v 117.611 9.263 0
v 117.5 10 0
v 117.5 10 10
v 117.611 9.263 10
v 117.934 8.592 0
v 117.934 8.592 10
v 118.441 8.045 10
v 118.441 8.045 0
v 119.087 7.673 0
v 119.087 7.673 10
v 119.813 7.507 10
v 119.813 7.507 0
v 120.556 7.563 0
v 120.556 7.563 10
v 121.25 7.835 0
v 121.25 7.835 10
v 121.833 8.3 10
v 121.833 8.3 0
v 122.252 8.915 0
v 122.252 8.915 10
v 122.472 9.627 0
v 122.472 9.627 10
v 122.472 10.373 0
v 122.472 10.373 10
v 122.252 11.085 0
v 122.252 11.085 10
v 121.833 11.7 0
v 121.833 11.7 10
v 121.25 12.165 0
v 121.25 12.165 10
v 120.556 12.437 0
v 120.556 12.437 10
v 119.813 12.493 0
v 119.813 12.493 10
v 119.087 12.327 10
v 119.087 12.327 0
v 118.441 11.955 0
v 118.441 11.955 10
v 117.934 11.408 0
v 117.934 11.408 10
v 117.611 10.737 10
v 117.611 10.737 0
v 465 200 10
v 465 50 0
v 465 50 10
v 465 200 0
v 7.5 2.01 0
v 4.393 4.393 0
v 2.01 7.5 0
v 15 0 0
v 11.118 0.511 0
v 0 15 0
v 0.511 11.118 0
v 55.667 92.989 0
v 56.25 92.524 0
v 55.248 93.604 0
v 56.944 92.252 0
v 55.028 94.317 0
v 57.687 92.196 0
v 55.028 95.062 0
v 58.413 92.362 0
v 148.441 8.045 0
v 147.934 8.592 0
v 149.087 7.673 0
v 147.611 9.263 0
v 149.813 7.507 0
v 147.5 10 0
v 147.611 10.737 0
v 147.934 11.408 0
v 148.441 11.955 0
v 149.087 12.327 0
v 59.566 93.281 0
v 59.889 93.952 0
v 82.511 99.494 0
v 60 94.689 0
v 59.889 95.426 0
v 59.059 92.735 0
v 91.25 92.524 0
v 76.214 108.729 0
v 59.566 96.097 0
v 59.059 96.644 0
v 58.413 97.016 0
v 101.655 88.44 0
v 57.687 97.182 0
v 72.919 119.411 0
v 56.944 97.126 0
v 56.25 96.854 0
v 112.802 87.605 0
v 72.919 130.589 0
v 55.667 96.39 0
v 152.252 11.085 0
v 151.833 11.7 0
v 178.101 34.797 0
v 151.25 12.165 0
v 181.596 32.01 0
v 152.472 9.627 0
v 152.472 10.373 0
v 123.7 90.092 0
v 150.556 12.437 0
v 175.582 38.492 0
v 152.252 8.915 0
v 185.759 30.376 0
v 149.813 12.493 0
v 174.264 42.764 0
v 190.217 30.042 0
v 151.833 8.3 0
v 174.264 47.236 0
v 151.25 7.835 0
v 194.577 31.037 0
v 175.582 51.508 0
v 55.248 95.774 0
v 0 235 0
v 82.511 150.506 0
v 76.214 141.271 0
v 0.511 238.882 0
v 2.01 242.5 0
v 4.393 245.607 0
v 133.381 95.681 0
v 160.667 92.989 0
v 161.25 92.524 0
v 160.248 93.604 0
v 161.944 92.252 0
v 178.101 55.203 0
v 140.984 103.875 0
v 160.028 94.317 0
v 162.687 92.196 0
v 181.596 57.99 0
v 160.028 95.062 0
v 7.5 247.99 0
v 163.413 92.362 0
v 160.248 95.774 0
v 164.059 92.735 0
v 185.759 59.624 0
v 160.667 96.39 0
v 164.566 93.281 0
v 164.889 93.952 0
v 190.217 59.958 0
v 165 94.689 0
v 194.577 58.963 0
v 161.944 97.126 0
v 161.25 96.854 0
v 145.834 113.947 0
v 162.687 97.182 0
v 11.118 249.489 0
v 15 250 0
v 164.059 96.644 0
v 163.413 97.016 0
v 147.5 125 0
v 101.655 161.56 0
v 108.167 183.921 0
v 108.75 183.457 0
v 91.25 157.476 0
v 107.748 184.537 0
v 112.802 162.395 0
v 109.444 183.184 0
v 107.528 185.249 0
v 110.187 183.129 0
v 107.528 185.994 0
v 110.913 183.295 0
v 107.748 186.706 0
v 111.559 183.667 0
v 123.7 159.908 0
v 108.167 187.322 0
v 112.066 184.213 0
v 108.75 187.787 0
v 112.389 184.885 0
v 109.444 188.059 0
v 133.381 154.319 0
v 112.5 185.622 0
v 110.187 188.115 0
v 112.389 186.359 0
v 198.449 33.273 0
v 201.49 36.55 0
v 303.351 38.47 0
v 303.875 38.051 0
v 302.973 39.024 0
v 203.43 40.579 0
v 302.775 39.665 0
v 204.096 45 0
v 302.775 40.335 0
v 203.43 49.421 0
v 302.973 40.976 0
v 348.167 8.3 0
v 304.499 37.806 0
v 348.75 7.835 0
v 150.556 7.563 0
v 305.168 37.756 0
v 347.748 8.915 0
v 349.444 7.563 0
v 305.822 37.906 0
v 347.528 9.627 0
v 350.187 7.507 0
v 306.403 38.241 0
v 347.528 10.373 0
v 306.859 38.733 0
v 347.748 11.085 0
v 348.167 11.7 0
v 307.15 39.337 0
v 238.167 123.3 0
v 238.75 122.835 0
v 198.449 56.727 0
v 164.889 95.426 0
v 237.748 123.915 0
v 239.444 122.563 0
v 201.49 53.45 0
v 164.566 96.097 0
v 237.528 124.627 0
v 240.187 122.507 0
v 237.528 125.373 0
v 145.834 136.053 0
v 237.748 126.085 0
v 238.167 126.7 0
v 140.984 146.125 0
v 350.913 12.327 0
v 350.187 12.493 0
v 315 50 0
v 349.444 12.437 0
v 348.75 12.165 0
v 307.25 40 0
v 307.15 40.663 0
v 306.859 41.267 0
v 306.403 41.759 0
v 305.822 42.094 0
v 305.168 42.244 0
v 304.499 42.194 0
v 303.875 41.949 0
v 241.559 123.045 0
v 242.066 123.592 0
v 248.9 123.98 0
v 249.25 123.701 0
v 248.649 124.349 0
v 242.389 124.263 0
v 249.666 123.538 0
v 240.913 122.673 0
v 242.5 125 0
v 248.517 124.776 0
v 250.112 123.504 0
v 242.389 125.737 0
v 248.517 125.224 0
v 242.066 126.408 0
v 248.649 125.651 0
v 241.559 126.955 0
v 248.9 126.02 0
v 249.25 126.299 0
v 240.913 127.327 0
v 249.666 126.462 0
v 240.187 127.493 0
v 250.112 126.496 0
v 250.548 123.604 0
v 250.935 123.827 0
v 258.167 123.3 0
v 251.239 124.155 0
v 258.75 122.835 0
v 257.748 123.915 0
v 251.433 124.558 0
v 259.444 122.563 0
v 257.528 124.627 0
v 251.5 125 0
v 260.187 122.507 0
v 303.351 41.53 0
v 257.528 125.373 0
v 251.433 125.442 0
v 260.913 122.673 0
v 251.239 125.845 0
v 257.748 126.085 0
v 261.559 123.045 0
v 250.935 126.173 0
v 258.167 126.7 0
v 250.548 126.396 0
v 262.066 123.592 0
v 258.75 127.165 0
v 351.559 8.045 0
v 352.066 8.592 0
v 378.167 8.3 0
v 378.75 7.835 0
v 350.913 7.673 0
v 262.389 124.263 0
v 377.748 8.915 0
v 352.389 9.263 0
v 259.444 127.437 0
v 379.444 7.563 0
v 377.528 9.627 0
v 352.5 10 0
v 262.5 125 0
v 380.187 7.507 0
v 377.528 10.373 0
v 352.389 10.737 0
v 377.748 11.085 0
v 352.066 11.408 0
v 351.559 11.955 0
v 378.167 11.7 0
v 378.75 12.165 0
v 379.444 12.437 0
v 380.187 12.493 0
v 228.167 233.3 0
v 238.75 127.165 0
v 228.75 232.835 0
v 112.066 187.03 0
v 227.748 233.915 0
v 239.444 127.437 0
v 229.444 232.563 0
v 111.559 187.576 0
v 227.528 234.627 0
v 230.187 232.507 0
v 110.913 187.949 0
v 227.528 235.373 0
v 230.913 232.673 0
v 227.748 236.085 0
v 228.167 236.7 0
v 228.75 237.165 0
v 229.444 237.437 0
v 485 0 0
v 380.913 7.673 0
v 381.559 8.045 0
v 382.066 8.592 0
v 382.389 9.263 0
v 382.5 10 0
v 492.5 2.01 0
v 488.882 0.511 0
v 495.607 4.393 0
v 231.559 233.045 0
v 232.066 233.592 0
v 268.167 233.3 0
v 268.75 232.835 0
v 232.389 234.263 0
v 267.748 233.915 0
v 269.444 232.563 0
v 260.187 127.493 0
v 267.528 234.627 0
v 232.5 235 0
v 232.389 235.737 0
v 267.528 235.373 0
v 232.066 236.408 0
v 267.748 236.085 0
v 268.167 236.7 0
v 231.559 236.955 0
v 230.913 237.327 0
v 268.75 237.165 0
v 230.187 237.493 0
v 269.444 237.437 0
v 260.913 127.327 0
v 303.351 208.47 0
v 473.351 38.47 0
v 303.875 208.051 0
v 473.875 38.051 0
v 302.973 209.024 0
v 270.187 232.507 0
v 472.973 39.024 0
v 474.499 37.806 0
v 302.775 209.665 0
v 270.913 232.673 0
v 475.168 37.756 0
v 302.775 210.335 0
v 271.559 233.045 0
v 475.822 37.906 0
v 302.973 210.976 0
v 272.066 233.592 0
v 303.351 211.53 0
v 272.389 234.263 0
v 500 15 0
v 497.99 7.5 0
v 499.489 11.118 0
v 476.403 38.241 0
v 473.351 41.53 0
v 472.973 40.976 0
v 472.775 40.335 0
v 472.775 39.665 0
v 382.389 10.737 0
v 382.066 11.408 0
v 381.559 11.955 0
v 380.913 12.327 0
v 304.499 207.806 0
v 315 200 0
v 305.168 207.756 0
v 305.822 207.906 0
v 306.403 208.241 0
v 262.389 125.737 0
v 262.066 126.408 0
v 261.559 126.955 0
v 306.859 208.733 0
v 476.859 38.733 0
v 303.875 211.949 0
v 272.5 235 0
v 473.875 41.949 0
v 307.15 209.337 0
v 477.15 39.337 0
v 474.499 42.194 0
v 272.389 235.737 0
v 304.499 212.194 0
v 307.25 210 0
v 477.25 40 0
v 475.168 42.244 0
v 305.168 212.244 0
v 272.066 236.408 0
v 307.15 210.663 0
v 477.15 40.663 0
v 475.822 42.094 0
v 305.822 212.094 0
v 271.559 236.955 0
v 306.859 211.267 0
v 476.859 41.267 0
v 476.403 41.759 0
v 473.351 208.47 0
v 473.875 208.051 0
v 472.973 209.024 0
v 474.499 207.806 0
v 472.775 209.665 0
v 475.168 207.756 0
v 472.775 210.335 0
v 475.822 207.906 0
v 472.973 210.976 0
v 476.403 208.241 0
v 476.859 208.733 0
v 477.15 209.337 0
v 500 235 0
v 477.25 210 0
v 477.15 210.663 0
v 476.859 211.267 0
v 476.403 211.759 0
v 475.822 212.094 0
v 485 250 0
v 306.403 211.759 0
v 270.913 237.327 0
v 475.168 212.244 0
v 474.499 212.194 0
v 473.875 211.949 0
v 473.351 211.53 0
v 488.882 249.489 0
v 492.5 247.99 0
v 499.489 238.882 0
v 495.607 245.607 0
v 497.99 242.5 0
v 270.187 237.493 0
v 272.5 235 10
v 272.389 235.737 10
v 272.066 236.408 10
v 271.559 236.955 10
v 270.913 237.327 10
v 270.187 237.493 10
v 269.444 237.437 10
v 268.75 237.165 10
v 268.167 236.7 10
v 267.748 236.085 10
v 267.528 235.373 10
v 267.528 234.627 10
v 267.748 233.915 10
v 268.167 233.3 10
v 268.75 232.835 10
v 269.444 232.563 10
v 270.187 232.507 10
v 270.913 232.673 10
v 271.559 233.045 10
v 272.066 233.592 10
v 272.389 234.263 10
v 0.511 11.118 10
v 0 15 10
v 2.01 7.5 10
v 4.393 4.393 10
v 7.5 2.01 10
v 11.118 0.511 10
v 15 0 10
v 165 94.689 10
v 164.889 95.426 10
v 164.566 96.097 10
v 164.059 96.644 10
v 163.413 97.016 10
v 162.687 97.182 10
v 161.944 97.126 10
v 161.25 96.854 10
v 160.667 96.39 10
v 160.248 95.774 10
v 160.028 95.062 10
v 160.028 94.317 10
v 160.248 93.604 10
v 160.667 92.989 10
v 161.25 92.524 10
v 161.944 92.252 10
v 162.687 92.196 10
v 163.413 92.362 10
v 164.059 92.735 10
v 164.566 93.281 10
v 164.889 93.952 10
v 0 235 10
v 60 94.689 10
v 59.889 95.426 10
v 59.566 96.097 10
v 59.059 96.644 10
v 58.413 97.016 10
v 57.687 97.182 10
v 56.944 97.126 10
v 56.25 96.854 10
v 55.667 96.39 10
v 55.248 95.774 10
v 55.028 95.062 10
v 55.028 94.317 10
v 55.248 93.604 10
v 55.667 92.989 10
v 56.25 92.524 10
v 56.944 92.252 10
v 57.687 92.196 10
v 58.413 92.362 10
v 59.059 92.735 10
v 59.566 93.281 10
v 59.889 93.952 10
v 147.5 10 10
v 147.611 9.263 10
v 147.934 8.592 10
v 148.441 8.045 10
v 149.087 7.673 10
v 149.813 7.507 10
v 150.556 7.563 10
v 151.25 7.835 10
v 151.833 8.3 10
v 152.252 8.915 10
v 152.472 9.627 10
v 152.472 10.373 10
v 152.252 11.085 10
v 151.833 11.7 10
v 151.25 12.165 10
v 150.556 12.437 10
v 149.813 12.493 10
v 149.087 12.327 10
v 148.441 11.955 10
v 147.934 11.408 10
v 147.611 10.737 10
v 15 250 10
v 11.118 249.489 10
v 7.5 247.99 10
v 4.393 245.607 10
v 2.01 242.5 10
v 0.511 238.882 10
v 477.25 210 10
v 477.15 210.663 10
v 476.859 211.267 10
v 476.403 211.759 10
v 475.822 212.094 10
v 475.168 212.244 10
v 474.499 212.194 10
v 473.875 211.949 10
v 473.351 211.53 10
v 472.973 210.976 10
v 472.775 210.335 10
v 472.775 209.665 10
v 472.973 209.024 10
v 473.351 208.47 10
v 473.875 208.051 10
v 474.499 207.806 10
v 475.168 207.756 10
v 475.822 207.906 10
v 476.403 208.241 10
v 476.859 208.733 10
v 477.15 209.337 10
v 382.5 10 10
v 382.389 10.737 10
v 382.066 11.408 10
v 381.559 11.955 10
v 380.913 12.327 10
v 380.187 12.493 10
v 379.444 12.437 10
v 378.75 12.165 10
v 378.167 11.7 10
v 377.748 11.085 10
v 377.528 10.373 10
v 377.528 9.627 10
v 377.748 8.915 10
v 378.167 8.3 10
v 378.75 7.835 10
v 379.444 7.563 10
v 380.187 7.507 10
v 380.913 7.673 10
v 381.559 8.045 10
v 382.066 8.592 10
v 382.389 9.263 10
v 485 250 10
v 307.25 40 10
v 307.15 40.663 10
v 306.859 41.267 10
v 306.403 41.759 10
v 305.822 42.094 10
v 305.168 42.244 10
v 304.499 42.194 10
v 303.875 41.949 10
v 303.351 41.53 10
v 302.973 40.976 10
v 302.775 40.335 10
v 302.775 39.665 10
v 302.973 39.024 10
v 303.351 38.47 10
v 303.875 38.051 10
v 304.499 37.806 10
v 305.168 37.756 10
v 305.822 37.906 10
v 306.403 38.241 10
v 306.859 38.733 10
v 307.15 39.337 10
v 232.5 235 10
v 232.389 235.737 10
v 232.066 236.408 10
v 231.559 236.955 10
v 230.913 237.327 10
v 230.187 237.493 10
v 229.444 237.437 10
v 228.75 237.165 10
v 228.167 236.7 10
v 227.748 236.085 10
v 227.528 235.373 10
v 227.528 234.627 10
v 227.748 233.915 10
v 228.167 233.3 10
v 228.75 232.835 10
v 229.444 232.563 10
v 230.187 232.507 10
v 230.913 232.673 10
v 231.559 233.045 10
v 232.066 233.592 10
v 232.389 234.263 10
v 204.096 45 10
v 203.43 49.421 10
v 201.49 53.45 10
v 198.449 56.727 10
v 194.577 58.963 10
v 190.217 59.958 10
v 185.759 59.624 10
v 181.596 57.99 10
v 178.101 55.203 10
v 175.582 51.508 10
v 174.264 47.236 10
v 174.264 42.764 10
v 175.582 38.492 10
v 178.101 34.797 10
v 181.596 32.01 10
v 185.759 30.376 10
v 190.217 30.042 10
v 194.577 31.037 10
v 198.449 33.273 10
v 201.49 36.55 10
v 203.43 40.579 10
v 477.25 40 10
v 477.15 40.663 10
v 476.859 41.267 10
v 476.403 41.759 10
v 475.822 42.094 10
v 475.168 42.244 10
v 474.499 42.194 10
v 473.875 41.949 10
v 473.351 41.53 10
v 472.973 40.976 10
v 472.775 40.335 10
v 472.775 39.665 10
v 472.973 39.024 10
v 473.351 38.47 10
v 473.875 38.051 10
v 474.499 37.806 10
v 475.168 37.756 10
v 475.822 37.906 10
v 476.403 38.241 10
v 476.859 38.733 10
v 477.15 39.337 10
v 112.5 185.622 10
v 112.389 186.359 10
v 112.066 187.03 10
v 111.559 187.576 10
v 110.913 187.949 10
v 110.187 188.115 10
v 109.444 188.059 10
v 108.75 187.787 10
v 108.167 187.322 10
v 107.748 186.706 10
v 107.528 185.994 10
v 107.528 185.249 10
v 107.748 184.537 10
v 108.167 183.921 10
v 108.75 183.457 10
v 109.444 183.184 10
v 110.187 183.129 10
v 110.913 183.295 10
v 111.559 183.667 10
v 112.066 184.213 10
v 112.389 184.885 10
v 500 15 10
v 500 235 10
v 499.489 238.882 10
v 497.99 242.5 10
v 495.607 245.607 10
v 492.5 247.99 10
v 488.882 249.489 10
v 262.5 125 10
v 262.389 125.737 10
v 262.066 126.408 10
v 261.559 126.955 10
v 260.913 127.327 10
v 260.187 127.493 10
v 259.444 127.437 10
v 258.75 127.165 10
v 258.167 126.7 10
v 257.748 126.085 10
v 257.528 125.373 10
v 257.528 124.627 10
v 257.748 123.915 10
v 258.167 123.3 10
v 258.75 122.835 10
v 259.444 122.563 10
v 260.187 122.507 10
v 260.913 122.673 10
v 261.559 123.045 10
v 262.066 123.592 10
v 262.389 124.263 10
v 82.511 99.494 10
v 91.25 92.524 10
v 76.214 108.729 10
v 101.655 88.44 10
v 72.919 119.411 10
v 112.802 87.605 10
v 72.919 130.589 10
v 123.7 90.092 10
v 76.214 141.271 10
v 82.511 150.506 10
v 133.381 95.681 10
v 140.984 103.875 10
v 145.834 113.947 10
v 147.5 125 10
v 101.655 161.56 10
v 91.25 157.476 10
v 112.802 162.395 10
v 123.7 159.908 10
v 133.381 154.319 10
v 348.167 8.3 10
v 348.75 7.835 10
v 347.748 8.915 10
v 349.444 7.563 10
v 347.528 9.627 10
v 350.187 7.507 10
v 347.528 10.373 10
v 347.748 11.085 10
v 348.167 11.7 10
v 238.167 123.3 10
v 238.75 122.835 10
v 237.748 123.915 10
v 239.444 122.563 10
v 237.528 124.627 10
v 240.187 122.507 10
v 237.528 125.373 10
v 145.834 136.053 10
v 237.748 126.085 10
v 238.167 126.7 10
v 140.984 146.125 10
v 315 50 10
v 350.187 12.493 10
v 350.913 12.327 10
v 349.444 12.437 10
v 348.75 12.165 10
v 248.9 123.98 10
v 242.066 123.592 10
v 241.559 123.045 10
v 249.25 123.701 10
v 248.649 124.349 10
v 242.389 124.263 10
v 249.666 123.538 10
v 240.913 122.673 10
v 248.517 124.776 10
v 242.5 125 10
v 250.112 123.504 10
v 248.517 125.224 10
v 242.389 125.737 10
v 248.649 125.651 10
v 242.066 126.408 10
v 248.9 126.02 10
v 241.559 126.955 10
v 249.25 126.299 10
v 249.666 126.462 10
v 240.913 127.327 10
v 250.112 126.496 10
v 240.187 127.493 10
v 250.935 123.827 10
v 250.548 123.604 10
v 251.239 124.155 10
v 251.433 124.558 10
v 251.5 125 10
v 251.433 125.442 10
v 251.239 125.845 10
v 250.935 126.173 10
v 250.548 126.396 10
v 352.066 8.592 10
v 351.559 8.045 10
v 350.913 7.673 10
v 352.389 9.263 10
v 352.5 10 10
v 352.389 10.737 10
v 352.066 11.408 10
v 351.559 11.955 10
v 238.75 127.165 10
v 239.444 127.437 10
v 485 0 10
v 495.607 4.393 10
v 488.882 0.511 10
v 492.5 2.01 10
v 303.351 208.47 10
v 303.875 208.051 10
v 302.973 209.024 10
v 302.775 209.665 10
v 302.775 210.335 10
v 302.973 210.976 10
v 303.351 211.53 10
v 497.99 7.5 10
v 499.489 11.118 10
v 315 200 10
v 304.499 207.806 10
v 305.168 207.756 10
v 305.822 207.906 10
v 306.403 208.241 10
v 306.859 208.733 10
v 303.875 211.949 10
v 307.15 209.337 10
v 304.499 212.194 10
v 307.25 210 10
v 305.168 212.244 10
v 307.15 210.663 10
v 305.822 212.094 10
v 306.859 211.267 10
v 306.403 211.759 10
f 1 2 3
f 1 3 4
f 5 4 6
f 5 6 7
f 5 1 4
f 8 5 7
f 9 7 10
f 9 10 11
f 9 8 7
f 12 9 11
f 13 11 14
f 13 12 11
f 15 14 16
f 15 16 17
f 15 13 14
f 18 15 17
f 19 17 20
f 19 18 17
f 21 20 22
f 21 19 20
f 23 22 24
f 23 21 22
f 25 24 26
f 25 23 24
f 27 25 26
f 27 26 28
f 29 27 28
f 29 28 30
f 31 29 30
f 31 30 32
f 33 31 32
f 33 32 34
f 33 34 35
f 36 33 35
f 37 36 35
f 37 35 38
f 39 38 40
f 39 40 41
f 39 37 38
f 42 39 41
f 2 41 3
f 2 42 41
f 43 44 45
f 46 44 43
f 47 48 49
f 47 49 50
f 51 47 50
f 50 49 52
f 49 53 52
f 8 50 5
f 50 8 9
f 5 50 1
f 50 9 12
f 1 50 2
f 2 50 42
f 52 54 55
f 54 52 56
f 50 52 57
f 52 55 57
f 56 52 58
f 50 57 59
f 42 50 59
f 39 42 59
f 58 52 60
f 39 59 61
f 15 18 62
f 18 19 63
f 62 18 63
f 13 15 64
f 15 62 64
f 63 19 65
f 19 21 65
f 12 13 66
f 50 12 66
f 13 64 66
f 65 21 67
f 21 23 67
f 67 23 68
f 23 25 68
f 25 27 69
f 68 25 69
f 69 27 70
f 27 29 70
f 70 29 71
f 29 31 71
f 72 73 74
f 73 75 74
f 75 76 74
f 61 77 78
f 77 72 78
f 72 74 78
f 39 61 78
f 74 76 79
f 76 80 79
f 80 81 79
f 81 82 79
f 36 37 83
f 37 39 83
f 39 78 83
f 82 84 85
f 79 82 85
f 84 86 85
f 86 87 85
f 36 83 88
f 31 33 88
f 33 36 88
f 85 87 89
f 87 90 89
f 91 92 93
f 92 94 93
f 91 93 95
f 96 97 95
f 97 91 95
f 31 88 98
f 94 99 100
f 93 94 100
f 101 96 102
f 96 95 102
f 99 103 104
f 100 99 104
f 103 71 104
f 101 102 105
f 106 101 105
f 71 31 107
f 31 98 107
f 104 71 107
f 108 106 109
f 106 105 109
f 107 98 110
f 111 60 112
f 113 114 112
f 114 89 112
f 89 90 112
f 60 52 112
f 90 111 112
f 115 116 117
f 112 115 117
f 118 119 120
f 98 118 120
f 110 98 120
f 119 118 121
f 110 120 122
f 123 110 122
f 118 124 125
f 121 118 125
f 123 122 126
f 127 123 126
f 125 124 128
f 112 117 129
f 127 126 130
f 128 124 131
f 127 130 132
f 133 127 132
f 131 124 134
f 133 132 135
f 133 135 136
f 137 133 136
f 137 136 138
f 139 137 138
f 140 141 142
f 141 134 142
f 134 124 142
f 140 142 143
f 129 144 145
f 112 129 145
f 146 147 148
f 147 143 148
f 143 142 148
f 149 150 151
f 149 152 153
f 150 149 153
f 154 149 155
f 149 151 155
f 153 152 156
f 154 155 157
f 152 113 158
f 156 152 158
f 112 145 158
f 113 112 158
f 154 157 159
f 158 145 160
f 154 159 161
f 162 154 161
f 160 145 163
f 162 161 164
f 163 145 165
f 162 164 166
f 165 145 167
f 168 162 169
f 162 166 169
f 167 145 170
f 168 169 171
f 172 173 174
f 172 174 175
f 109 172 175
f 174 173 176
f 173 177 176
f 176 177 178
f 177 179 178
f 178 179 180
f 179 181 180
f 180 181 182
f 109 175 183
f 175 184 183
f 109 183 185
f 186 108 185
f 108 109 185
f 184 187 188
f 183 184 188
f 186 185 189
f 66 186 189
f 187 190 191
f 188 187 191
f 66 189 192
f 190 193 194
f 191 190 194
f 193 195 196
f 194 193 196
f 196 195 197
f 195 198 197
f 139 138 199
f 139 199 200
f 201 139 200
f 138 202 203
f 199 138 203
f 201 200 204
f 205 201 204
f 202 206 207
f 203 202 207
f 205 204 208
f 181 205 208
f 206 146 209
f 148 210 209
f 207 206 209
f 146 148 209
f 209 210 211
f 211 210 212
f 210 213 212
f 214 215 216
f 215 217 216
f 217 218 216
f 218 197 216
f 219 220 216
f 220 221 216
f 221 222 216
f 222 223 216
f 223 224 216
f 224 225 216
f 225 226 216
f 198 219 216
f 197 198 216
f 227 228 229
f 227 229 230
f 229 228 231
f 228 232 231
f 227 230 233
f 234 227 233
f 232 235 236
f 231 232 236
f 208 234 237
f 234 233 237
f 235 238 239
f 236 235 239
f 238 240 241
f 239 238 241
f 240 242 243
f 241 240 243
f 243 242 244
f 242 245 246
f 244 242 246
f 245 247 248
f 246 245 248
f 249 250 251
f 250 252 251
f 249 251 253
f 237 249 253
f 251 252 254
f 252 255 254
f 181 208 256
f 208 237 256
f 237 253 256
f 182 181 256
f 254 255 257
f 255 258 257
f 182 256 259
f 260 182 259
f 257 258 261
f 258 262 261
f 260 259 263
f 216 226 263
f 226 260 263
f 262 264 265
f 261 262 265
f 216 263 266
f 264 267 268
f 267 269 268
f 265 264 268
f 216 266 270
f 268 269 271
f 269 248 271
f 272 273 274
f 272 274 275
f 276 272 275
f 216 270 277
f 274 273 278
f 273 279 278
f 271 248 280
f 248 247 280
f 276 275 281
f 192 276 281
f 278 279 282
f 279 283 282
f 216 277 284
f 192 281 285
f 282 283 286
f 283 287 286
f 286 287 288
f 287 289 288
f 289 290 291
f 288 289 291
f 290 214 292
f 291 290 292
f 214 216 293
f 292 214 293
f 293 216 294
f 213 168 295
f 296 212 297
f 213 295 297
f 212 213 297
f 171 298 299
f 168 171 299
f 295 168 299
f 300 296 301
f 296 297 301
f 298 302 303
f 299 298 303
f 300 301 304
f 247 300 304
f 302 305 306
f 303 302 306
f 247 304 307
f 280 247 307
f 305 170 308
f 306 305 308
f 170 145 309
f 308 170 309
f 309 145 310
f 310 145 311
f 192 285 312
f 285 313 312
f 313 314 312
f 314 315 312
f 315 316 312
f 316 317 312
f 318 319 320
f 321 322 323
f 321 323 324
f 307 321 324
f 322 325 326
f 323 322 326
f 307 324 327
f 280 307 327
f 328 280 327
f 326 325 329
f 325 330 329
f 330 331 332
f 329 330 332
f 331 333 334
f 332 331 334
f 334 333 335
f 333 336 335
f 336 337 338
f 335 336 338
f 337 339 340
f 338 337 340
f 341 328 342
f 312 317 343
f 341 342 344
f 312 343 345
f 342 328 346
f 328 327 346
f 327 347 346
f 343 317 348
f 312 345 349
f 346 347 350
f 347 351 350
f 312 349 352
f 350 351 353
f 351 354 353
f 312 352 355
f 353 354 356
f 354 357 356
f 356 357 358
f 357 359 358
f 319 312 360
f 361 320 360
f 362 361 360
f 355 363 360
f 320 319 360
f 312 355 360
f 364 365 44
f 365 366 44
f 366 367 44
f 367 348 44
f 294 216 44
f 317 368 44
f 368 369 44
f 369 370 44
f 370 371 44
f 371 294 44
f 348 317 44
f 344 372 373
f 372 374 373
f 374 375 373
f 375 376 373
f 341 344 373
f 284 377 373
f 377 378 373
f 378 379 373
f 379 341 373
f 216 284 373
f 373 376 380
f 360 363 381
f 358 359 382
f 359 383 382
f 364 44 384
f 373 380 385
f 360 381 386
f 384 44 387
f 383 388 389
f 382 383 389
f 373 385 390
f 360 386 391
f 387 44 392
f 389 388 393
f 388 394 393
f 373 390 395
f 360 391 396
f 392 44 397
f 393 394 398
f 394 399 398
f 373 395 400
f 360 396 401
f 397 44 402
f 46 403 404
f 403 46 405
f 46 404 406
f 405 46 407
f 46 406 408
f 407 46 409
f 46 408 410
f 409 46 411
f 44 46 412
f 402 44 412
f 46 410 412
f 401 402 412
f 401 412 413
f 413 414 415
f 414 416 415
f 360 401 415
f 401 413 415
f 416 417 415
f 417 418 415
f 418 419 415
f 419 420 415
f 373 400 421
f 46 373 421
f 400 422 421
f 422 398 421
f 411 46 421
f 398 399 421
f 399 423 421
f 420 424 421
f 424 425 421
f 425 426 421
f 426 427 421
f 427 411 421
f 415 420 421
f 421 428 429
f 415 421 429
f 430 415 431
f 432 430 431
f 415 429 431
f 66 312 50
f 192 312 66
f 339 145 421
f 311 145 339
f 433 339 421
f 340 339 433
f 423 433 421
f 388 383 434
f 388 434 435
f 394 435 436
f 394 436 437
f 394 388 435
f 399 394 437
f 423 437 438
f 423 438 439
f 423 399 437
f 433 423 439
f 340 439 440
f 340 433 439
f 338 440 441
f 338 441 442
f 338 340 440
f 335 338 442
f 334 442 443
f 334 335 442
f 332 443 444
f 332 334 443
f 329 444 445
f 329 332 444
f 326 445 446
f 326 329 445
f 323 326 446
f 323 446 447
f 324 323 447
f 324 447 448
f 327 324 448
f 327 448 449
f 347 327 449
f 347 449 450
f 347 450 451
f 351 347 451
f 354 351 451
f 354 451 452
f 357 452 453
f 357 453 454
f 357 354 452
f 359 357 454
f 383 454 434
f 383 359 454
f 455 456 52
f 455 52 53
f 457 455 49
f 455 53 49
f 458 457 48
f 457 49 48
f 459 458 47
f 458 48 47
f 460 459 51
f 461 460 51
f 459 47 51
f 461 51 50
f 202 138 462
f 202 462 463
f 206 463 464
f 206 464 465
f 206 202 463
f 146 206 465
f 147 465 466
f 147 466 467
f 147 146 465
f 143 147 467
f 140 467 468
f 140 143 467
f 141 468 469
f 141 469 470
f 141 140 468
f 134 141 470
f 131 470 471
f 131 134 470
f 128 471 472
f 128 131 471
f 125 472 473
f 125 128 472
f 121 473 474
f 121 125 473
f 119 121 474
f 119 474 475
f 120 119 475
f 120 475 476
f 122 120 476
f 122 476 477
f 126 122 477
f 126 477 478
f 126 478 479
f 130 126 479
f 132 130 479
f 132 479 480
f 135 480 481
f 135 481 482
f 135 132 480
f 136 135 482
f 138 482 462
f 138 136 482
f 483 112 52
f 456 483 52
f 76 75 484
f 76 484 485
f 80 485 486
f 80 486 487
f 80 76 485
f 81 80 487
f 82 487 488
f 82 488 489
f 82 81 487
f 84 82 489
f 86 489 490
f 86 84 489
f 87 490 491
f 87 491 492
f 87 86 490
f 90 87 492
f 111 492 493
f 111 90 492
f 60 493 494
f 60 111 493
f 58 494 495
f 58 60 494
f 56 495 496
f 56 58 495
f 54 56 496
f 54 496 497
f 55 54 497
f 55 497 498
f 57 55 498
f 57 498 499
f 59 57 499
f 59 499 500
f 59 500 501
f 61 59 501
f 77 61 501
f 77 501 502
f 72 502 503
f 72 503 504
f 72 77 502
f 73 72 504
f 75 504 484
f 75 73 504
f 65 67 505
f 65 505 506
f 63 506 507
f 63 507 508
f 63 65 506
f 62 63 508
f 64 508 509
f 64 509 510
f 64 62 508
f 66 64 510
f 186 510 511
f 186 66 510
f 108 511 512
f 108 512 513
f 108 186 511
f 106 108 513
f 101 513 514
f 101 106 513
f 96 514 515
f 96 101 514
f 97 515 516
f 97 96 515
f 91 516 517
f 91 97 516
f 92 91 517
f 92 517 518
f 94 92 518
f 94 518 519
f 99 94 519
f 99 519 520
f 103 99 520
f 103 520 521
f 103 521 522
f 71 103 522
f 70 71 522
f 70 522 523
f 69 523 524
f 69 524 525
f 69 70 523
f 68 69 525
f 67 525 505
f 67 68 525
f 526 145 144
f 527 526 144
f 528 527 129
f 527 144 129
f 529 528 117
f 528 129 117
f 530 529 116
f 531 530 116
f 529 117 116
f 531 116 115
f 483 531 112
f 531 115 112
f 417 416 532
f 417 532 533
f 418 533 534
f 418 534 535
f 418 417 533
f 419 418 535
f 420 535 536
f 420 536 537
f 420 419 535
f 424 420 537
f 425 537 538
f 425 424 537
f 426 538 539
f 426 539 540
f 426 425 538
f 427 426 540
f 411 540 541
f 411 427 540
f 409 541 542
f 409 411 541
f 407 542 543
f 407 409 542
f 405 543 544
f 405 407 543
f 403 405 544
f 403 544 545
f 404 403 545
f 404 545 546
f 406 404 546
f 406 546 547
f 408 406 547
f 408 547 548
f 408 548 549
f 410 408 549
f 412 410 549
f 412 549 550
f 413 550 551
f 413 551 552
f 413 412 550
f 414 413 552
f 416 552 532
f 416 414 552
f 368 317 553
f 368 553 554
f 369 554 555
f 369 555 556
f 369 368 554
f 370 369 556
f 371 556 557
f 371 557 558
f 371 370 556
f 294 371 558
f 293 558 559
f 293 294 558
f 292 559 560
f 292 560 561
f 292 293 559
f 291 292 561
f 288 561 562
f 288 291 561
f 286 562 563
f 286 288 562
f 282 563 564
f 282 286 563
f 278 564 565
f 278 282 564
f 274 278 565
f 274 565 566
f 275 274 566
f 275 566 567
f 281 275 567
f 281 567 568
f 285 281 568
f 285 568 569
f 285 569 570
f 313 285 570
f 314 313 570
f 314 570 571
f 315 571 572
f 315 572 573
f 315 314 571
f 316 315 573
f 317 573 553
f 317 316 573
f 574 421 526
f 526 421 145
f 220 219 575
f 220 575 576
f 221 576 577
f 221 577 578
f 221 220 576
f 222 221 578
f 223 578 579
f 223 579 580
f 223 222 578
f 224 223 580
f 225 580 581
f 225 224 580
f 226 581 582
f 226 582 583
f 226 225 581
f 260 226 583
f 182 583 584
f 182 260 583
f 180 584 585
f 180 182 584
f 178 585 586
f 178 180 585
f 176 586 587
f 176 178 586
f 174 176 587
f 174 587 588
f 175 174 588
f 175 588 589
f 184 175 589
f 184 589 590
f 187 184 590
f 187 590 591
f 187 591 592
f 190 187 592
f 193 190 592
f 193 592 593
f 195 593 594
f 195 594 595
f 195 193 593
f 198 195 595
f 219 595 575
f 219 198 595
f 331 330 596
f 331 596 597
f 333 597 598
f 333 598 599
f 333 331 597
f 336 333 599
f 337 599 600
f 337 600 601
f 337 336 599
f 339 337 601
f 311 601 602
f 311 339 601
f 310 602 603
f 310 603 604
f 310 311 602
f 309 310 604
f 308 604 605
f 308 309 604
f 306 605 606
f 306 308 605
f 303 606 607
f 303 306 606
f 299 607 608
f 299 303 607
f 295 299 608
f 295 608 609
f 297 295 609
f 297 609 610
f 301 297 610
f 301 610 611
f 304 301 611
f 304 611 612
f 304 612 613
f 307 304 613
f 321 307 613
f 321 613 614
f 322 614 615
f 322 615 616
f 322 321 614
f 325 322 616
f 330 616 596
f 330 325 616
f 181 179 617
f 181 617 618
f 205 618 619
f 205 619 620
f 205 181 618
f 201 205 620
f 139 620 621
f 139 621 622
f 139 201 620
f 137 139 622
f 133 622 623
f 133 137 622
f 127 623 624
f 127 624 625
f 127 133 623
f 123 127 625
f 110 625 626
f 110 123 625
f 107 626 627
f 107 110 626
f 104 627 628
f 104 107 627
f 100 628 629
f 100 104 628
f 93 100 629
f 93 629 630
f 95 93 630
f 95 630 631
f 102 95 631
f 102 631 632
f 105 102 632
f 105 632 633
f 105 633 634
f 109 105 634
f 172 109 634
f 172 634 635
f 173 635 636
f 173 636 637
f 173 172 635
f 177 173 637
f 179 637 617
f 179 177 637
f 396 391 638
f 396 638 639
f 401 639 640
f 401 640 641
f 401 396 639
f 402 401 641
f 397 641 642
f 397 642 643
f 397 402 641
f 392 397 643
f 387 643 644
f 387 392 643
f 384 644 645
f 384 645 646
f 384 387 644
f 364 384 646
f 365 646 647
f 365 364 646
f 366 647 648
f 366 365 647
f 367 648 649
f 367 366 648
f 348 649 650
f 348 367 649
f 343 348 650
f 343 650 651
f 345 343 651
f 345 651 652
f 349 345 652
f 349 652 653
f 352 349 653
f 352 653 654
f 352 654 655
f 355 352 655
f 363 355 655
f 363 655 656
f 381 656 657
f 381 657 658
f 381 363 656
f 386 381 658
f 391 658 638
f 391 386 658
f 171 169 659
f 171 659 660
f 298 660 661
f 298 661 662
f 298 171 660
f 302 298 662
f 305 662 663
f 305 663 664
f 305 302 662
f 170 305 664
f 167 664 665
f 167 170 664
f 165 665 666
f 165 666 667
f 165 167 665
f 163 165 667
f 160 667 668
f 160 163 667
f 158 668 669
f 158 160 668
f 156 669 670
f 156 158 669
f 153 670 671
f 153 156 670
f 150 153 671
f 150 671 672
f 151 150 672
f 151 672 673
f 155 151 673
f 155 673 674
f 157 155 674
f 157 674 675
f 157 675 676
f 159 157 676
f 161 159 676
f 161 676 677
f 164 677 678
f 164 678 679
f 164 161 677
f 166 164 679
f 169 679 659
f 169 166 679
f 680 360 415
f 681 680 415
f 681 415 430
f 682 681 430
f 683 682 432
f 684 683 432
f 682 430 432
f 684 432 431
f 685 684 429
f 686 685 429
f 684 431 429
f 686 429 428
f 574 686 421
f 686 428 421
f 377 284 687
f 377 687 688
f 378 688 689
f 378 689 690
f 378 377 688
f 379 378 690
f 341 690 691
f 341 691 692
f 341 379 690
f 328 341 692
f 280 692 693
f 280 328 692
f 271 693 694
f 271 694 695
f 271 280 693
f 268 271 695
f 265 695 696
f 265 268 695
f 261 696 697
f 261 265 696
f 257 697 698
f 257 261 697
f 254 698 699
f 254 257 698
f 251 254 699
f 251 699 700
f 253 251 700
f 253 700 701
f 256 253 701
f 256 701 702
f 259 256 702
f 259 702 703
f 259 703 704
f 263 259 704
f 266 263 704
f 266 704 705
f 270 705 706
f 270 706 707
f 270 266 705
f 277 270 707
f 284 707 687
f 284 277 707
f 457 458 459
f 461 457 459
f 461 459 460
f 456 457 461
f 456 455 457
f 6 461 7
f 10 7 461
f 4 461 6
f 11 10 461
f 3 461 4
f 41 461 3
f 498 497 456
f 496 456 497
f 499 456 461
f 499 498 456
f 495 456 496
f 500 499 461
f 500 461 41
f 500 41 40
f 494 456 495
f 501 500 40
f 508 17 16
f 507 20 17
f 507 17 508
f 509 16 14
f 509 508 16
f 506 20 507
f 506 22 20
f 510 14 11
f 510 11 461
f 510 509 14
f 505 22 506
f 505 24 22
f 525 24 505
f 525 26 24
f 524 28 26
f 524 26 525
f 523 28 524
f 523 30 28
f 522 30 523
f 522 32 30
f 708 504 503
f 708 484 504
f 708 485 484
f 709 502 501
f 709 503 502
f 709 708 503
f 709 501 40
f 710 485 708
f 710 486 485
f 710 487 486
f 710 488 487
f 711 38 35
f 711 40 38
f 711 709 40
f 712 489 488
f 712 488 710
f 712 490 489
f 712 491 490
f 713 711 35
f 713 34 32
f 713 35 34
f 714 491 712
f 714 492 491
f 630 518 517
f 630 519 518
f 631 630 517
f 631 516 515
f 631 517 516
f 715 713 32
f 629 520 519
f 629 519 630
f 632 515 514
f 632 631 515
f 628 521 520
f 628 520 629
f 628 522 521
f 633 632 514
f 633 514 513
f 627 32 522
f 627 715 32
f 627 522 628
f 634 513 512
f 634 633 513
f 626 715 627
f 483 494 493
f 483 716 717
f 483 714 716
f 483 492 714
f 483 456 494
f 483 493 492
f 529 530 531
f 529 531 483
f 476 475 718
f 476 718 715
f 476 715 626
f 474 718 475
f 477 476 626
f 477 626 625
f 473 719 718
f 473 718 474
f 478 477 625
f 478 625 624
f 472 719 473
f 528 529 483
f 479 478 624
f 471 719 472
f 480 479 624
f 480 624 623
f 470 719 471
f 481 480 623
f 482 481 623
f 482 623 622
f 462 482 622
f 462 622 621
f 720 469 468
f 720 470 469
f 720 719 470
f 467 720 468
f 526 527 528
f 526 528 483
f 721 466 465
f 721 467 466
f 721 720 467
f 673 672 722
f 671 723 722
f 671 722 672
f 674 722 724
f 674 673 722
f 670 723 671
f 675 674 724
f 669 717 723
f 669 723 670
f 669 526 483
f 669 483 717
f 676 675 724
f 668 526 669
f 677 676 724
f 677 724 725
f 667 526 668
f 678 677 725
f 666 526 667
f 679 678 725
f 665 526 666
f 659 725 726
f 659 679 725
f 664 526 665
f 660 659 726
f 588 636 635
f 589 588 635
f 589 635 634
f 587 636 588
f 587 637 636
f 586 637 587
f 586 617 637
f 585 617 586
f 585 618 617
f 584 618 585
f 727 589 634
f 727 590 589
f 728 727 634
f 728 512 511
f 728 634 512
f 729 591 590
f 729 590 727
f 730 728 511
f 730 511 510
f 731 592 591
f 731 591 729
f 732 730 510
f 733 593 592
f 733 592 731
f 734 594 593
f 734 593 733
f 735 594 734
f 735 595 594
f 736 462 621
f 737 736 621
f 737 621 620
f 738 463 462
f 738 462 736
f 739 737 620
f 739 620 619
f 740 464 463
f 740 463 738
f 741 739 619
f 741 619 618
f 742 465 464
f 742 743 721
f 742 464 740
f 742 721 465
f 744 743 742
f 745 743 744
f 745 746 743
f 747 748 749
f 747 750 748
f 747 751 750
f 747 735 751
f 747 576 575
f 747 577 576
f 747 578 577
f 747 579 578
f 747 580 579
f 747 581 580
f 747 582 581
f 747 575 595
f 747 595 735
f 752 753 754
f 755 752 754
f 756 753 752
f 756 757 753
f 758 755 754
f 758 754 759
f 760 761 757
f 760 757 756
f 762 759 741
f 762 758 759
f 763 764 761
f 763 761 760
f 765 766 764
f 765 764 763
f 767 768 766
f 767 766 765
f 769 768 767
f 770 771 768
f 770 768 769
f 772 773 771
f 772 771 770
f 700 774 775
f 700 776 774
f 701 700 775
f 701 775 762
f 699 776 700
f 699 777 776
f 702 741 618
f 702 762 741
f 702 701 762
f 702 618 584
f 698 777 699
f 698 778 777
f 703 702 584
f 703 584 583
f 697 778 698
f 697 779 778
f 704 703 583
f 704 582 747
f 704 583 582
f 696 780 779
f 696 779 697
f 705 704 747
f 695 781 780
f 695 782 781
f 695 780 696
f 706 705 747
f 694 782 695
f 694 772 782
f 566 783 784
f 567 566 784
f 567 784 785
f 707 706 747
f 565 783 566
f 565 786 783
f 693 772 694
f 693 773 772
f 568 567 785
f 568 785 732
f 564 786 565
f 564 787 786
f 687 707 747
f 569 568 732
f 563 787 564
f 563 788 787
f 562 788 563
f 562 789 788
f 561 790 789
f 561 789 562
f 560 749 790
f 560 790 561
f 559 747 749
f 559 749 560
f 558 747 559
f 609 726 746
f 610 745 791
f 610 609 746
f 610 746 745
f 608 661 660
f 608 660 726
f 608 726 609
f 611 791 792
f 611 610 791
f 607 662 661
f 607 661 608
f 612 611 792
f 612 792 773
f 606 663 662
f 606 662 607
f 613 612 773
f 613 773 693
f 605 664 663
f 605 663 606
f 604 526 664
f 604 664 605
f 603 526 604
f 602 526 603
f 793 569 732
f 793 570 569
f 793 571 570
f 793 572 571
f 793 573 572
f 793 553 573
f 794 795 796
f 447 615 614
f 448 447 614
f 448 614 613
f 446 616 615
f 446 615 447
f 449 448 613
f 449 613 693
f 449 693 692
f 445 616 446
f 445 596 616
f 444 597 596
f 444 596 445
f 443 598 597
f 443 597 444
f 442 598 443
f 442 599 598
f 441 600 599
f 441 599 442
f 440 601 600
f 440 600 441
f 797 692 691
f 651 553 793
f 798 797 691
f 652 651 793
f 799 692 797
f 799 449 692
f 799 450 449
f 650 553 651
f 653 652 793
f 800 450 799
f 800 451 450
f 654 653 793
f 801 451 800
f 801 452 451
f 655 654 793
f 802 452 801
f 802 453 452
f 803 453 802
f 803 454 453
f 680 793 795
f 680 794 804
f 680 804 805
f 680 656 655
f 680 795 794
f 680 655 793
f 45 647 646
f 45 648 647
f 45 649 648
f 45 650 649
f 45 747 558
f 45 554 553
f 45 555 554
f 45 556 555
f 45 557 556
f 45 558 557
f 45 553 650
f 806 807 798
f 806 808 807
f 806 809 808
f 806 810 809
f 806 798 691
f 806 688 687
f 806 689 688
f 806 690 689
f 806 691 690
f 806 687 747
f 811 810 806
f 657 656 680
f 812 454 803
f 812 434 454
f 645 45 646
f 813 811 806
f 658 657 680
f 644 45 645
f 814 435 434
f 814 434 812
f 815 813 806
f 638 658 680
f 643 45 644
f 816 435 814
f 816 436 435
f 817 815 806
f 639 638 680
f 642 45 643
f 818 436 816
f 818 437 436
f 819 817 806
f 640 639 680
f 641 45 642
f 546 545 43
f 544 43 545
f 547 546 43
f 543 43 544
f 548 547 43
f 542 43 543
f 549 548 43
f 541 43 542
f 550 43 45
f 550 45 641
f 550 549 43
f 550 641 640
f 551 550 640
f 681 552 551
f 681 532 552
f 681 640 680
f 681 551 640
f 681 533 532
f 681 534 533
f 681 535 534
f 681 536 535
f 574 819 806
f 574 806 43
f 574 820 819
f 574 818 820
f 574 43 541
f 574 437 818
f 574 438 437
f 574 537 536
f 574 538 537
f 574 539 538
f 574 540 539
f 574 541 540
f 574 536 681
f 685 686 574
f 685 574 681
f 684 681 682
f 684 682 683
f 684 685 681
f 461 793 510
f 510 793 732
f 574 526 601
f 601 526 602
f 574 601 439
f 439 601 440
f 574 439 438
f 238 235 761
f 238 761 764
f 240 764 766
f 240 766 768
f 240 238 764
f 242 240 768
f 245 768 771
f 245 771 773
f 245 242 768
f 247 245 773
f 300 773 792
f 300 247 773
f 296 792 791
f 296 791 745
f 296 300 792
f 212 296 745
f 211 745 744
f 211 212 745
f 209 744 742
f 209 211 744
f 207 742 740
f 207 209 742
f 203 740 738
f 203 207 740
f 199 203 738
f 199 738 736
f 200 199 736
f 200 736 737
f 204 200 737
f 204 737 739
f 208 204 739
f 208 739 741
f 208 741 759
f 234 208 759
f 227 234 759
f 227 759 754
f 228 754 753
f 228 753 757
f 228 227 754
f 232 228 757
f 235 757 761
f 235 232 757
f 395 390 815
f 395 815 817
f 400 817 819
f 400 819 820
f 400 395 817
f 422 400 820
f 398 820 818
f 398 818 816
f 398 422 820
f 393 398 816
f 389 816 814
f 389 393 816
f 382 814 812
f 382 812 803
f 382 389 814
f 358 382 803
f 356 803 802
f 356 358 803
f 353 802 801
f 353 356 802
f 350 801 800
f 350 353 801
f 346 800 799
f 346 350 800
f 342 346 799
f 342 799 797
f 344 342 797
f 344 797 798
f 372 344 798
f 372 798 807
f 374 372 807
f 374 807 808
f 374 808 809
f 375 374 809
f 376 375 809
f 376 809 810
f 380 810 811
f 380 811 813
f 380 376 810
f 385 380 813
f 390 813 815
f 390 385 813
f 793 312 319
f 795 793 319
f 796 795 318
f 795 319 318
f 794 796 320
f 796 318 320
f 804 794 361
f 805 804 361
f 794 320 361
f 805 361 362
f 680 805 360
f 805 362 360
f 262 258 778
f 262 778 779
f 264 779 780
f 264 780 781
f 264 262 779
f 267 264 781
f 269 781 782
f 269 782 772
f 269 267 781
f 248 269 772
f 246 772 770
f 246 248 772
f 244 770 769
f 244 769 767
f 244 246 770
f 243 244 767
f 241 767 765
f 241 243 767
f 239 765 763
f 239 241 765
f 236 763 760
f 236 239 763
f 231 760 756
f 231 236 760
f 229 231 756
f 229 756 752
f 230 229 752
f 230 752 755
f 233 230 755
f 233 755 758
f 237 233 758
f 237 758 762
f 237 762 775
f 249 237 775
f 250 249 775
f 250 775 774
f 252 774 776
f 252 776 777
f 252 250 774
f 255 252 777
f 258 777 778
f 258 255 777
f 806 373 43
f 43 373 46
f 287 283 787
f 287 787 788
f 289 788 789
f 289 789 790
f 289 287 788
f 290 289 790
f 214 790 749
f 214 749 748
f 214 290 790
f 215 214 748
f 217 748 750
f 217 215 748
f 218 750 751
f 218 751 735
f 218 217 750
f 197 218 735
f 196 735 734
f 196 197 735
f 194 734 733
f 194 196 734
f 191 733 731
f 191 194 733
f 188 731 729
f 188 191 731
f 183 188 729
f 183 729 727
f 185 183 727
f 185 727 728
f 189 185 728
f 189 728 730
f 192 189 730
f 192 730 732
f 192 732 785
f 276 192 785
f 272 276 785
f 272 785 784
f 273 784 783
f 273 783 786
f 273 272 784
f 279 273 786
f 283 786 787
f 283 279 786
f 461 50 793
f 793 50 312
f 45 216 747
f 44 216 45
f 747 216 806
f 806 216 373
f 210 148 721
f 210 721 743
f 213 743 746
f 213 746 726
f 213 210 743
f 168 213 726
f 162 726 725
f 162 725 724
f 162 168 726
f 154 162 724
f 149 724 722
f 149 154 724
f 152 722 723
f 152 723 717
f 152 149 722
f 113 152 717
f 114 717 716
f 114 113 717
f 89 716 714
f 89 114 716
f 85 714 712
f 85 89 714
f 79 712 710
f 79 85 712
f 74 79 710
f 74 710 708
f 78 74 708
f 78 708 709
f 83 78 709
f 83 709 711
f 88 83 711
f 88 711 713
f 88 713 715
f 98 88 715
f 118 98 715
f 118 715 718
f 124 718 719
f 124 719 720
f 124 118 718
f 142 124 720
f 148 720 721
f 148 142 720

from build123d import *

# Parameters (mm, degrees)
CROQUIS1_R              = 2.5
CROQUIS1_R_2            = 37.5
CROQUIS1_R_3            = 15
CROQUIS1_R_4            = 2.25
CROQUIS1_R_5            = 1.5
CROQUIS1_W              = 150
CROQUIS1_H              = 150
SALIENTE_EXTRUIR1_DEPTH = 10


with BuildPart() as part:
    # Croquis1 → Saliente-Extruir1 (new body)
    with BuildSketch(Plane.XY):
        with BuildLine():
            Line((15, 0), (485, 0))
            ThreePointArc((485, 0), (495.606601718, 4.393398282), (500, 15))
            Line((500, 15), (500, 235))
            ThreePointArc((500, 235), (495.606601718, 245.606601718), (485, 250))
            Line((485, 250), (15, 250))
            ThreePointArc((15, 250), (4.393398282, 245.606601718), (0, 235))
            Line((0, 235), (0, 15))
            ThreePointArc((0, 15), (4.393398282, 4.393398282), (15, 0))
        make_face()
        with Locations((110, 185.621778265)):
            Circle(CROQUIS1_R, mode=Mode.SUBTRACT)
        with Locations((162.5, 94.689110868)):
            Circle(CROQUIS1_R, mode=Mode.SUBTRACT)
        with Locations((57.5, 94.689110868)):
            Circle(CROQUIS1_R, mode=Mode.SUBTRACT)
        with Locations((110, 125)):
            Circle(CROQUIS1_R_2, mode=Mode.SUBTRACT)
        with Locations((230, 235)):
            Circle(CROQUIS1_R, mode=Mode.SUBTRACT)
        with Locations((270, 235)):
            Circle(CROQUIS1_R, mode=Mode.SUBTRACT)
        with Locations((189.096460098, 45)):
            Circle(CROQUIS1_R_3, mode=Mode.SUBTRACT)
        with Locations((475, 210)):
            Circle(CROQUIS1_R_4, mode=Mode.SUBTRACT)
        with Locations((305, 210)):
            Circle(CROQUIS1_R_4, mode=Mode.SUBTRACT)
        with Locations((305, 40)):
            Circle(CROQUIS1_R_4, mode=Mode.SUBTRACT)
        with Locations((475, 40)):
            Circle(CROQUIS1_R_4, mode=Mode.SUBTRACT)
        with Locations((350, 10)):
            Circle(CROQUIS1_R, mode=Mode.SUBTRACT)
        with Locations((380, 10)):
            Circle(CROQUIS1_R, mode=Mode.SUBTRACT)
        with Locations(Location((120, 10, 0), (0, 0, 180))):
            Circle(CROQUIS1_R, mode=Mode.SUBTRACT)
        with Locations(Location((150, 10, 0), (0, 0, 180))):
            Circle(CROQUIS1_R, mode=Mode.SUBTRACT)
        with Locations((240, 125)):
            Circle(CROQUIS1_R, mode=Mode.SUBTRACT)
        with Locations((260, 125)):
            Circle(CROQUIS1_R, mode=Mode.SUBTRACT)
        with Locations((250, 125)):
            Circle(CROQUIS1_R_5, mode=Mode.SUBTRACT)
        with Locations((390, 125)):
            Rectangle(CROQUIS1_W, CROQUIS1_H, mode=Mode.SUBTRACT)
    extrude(amount=SALIENTE_EXTRUIR1_DEPTH)


solid = part.part
